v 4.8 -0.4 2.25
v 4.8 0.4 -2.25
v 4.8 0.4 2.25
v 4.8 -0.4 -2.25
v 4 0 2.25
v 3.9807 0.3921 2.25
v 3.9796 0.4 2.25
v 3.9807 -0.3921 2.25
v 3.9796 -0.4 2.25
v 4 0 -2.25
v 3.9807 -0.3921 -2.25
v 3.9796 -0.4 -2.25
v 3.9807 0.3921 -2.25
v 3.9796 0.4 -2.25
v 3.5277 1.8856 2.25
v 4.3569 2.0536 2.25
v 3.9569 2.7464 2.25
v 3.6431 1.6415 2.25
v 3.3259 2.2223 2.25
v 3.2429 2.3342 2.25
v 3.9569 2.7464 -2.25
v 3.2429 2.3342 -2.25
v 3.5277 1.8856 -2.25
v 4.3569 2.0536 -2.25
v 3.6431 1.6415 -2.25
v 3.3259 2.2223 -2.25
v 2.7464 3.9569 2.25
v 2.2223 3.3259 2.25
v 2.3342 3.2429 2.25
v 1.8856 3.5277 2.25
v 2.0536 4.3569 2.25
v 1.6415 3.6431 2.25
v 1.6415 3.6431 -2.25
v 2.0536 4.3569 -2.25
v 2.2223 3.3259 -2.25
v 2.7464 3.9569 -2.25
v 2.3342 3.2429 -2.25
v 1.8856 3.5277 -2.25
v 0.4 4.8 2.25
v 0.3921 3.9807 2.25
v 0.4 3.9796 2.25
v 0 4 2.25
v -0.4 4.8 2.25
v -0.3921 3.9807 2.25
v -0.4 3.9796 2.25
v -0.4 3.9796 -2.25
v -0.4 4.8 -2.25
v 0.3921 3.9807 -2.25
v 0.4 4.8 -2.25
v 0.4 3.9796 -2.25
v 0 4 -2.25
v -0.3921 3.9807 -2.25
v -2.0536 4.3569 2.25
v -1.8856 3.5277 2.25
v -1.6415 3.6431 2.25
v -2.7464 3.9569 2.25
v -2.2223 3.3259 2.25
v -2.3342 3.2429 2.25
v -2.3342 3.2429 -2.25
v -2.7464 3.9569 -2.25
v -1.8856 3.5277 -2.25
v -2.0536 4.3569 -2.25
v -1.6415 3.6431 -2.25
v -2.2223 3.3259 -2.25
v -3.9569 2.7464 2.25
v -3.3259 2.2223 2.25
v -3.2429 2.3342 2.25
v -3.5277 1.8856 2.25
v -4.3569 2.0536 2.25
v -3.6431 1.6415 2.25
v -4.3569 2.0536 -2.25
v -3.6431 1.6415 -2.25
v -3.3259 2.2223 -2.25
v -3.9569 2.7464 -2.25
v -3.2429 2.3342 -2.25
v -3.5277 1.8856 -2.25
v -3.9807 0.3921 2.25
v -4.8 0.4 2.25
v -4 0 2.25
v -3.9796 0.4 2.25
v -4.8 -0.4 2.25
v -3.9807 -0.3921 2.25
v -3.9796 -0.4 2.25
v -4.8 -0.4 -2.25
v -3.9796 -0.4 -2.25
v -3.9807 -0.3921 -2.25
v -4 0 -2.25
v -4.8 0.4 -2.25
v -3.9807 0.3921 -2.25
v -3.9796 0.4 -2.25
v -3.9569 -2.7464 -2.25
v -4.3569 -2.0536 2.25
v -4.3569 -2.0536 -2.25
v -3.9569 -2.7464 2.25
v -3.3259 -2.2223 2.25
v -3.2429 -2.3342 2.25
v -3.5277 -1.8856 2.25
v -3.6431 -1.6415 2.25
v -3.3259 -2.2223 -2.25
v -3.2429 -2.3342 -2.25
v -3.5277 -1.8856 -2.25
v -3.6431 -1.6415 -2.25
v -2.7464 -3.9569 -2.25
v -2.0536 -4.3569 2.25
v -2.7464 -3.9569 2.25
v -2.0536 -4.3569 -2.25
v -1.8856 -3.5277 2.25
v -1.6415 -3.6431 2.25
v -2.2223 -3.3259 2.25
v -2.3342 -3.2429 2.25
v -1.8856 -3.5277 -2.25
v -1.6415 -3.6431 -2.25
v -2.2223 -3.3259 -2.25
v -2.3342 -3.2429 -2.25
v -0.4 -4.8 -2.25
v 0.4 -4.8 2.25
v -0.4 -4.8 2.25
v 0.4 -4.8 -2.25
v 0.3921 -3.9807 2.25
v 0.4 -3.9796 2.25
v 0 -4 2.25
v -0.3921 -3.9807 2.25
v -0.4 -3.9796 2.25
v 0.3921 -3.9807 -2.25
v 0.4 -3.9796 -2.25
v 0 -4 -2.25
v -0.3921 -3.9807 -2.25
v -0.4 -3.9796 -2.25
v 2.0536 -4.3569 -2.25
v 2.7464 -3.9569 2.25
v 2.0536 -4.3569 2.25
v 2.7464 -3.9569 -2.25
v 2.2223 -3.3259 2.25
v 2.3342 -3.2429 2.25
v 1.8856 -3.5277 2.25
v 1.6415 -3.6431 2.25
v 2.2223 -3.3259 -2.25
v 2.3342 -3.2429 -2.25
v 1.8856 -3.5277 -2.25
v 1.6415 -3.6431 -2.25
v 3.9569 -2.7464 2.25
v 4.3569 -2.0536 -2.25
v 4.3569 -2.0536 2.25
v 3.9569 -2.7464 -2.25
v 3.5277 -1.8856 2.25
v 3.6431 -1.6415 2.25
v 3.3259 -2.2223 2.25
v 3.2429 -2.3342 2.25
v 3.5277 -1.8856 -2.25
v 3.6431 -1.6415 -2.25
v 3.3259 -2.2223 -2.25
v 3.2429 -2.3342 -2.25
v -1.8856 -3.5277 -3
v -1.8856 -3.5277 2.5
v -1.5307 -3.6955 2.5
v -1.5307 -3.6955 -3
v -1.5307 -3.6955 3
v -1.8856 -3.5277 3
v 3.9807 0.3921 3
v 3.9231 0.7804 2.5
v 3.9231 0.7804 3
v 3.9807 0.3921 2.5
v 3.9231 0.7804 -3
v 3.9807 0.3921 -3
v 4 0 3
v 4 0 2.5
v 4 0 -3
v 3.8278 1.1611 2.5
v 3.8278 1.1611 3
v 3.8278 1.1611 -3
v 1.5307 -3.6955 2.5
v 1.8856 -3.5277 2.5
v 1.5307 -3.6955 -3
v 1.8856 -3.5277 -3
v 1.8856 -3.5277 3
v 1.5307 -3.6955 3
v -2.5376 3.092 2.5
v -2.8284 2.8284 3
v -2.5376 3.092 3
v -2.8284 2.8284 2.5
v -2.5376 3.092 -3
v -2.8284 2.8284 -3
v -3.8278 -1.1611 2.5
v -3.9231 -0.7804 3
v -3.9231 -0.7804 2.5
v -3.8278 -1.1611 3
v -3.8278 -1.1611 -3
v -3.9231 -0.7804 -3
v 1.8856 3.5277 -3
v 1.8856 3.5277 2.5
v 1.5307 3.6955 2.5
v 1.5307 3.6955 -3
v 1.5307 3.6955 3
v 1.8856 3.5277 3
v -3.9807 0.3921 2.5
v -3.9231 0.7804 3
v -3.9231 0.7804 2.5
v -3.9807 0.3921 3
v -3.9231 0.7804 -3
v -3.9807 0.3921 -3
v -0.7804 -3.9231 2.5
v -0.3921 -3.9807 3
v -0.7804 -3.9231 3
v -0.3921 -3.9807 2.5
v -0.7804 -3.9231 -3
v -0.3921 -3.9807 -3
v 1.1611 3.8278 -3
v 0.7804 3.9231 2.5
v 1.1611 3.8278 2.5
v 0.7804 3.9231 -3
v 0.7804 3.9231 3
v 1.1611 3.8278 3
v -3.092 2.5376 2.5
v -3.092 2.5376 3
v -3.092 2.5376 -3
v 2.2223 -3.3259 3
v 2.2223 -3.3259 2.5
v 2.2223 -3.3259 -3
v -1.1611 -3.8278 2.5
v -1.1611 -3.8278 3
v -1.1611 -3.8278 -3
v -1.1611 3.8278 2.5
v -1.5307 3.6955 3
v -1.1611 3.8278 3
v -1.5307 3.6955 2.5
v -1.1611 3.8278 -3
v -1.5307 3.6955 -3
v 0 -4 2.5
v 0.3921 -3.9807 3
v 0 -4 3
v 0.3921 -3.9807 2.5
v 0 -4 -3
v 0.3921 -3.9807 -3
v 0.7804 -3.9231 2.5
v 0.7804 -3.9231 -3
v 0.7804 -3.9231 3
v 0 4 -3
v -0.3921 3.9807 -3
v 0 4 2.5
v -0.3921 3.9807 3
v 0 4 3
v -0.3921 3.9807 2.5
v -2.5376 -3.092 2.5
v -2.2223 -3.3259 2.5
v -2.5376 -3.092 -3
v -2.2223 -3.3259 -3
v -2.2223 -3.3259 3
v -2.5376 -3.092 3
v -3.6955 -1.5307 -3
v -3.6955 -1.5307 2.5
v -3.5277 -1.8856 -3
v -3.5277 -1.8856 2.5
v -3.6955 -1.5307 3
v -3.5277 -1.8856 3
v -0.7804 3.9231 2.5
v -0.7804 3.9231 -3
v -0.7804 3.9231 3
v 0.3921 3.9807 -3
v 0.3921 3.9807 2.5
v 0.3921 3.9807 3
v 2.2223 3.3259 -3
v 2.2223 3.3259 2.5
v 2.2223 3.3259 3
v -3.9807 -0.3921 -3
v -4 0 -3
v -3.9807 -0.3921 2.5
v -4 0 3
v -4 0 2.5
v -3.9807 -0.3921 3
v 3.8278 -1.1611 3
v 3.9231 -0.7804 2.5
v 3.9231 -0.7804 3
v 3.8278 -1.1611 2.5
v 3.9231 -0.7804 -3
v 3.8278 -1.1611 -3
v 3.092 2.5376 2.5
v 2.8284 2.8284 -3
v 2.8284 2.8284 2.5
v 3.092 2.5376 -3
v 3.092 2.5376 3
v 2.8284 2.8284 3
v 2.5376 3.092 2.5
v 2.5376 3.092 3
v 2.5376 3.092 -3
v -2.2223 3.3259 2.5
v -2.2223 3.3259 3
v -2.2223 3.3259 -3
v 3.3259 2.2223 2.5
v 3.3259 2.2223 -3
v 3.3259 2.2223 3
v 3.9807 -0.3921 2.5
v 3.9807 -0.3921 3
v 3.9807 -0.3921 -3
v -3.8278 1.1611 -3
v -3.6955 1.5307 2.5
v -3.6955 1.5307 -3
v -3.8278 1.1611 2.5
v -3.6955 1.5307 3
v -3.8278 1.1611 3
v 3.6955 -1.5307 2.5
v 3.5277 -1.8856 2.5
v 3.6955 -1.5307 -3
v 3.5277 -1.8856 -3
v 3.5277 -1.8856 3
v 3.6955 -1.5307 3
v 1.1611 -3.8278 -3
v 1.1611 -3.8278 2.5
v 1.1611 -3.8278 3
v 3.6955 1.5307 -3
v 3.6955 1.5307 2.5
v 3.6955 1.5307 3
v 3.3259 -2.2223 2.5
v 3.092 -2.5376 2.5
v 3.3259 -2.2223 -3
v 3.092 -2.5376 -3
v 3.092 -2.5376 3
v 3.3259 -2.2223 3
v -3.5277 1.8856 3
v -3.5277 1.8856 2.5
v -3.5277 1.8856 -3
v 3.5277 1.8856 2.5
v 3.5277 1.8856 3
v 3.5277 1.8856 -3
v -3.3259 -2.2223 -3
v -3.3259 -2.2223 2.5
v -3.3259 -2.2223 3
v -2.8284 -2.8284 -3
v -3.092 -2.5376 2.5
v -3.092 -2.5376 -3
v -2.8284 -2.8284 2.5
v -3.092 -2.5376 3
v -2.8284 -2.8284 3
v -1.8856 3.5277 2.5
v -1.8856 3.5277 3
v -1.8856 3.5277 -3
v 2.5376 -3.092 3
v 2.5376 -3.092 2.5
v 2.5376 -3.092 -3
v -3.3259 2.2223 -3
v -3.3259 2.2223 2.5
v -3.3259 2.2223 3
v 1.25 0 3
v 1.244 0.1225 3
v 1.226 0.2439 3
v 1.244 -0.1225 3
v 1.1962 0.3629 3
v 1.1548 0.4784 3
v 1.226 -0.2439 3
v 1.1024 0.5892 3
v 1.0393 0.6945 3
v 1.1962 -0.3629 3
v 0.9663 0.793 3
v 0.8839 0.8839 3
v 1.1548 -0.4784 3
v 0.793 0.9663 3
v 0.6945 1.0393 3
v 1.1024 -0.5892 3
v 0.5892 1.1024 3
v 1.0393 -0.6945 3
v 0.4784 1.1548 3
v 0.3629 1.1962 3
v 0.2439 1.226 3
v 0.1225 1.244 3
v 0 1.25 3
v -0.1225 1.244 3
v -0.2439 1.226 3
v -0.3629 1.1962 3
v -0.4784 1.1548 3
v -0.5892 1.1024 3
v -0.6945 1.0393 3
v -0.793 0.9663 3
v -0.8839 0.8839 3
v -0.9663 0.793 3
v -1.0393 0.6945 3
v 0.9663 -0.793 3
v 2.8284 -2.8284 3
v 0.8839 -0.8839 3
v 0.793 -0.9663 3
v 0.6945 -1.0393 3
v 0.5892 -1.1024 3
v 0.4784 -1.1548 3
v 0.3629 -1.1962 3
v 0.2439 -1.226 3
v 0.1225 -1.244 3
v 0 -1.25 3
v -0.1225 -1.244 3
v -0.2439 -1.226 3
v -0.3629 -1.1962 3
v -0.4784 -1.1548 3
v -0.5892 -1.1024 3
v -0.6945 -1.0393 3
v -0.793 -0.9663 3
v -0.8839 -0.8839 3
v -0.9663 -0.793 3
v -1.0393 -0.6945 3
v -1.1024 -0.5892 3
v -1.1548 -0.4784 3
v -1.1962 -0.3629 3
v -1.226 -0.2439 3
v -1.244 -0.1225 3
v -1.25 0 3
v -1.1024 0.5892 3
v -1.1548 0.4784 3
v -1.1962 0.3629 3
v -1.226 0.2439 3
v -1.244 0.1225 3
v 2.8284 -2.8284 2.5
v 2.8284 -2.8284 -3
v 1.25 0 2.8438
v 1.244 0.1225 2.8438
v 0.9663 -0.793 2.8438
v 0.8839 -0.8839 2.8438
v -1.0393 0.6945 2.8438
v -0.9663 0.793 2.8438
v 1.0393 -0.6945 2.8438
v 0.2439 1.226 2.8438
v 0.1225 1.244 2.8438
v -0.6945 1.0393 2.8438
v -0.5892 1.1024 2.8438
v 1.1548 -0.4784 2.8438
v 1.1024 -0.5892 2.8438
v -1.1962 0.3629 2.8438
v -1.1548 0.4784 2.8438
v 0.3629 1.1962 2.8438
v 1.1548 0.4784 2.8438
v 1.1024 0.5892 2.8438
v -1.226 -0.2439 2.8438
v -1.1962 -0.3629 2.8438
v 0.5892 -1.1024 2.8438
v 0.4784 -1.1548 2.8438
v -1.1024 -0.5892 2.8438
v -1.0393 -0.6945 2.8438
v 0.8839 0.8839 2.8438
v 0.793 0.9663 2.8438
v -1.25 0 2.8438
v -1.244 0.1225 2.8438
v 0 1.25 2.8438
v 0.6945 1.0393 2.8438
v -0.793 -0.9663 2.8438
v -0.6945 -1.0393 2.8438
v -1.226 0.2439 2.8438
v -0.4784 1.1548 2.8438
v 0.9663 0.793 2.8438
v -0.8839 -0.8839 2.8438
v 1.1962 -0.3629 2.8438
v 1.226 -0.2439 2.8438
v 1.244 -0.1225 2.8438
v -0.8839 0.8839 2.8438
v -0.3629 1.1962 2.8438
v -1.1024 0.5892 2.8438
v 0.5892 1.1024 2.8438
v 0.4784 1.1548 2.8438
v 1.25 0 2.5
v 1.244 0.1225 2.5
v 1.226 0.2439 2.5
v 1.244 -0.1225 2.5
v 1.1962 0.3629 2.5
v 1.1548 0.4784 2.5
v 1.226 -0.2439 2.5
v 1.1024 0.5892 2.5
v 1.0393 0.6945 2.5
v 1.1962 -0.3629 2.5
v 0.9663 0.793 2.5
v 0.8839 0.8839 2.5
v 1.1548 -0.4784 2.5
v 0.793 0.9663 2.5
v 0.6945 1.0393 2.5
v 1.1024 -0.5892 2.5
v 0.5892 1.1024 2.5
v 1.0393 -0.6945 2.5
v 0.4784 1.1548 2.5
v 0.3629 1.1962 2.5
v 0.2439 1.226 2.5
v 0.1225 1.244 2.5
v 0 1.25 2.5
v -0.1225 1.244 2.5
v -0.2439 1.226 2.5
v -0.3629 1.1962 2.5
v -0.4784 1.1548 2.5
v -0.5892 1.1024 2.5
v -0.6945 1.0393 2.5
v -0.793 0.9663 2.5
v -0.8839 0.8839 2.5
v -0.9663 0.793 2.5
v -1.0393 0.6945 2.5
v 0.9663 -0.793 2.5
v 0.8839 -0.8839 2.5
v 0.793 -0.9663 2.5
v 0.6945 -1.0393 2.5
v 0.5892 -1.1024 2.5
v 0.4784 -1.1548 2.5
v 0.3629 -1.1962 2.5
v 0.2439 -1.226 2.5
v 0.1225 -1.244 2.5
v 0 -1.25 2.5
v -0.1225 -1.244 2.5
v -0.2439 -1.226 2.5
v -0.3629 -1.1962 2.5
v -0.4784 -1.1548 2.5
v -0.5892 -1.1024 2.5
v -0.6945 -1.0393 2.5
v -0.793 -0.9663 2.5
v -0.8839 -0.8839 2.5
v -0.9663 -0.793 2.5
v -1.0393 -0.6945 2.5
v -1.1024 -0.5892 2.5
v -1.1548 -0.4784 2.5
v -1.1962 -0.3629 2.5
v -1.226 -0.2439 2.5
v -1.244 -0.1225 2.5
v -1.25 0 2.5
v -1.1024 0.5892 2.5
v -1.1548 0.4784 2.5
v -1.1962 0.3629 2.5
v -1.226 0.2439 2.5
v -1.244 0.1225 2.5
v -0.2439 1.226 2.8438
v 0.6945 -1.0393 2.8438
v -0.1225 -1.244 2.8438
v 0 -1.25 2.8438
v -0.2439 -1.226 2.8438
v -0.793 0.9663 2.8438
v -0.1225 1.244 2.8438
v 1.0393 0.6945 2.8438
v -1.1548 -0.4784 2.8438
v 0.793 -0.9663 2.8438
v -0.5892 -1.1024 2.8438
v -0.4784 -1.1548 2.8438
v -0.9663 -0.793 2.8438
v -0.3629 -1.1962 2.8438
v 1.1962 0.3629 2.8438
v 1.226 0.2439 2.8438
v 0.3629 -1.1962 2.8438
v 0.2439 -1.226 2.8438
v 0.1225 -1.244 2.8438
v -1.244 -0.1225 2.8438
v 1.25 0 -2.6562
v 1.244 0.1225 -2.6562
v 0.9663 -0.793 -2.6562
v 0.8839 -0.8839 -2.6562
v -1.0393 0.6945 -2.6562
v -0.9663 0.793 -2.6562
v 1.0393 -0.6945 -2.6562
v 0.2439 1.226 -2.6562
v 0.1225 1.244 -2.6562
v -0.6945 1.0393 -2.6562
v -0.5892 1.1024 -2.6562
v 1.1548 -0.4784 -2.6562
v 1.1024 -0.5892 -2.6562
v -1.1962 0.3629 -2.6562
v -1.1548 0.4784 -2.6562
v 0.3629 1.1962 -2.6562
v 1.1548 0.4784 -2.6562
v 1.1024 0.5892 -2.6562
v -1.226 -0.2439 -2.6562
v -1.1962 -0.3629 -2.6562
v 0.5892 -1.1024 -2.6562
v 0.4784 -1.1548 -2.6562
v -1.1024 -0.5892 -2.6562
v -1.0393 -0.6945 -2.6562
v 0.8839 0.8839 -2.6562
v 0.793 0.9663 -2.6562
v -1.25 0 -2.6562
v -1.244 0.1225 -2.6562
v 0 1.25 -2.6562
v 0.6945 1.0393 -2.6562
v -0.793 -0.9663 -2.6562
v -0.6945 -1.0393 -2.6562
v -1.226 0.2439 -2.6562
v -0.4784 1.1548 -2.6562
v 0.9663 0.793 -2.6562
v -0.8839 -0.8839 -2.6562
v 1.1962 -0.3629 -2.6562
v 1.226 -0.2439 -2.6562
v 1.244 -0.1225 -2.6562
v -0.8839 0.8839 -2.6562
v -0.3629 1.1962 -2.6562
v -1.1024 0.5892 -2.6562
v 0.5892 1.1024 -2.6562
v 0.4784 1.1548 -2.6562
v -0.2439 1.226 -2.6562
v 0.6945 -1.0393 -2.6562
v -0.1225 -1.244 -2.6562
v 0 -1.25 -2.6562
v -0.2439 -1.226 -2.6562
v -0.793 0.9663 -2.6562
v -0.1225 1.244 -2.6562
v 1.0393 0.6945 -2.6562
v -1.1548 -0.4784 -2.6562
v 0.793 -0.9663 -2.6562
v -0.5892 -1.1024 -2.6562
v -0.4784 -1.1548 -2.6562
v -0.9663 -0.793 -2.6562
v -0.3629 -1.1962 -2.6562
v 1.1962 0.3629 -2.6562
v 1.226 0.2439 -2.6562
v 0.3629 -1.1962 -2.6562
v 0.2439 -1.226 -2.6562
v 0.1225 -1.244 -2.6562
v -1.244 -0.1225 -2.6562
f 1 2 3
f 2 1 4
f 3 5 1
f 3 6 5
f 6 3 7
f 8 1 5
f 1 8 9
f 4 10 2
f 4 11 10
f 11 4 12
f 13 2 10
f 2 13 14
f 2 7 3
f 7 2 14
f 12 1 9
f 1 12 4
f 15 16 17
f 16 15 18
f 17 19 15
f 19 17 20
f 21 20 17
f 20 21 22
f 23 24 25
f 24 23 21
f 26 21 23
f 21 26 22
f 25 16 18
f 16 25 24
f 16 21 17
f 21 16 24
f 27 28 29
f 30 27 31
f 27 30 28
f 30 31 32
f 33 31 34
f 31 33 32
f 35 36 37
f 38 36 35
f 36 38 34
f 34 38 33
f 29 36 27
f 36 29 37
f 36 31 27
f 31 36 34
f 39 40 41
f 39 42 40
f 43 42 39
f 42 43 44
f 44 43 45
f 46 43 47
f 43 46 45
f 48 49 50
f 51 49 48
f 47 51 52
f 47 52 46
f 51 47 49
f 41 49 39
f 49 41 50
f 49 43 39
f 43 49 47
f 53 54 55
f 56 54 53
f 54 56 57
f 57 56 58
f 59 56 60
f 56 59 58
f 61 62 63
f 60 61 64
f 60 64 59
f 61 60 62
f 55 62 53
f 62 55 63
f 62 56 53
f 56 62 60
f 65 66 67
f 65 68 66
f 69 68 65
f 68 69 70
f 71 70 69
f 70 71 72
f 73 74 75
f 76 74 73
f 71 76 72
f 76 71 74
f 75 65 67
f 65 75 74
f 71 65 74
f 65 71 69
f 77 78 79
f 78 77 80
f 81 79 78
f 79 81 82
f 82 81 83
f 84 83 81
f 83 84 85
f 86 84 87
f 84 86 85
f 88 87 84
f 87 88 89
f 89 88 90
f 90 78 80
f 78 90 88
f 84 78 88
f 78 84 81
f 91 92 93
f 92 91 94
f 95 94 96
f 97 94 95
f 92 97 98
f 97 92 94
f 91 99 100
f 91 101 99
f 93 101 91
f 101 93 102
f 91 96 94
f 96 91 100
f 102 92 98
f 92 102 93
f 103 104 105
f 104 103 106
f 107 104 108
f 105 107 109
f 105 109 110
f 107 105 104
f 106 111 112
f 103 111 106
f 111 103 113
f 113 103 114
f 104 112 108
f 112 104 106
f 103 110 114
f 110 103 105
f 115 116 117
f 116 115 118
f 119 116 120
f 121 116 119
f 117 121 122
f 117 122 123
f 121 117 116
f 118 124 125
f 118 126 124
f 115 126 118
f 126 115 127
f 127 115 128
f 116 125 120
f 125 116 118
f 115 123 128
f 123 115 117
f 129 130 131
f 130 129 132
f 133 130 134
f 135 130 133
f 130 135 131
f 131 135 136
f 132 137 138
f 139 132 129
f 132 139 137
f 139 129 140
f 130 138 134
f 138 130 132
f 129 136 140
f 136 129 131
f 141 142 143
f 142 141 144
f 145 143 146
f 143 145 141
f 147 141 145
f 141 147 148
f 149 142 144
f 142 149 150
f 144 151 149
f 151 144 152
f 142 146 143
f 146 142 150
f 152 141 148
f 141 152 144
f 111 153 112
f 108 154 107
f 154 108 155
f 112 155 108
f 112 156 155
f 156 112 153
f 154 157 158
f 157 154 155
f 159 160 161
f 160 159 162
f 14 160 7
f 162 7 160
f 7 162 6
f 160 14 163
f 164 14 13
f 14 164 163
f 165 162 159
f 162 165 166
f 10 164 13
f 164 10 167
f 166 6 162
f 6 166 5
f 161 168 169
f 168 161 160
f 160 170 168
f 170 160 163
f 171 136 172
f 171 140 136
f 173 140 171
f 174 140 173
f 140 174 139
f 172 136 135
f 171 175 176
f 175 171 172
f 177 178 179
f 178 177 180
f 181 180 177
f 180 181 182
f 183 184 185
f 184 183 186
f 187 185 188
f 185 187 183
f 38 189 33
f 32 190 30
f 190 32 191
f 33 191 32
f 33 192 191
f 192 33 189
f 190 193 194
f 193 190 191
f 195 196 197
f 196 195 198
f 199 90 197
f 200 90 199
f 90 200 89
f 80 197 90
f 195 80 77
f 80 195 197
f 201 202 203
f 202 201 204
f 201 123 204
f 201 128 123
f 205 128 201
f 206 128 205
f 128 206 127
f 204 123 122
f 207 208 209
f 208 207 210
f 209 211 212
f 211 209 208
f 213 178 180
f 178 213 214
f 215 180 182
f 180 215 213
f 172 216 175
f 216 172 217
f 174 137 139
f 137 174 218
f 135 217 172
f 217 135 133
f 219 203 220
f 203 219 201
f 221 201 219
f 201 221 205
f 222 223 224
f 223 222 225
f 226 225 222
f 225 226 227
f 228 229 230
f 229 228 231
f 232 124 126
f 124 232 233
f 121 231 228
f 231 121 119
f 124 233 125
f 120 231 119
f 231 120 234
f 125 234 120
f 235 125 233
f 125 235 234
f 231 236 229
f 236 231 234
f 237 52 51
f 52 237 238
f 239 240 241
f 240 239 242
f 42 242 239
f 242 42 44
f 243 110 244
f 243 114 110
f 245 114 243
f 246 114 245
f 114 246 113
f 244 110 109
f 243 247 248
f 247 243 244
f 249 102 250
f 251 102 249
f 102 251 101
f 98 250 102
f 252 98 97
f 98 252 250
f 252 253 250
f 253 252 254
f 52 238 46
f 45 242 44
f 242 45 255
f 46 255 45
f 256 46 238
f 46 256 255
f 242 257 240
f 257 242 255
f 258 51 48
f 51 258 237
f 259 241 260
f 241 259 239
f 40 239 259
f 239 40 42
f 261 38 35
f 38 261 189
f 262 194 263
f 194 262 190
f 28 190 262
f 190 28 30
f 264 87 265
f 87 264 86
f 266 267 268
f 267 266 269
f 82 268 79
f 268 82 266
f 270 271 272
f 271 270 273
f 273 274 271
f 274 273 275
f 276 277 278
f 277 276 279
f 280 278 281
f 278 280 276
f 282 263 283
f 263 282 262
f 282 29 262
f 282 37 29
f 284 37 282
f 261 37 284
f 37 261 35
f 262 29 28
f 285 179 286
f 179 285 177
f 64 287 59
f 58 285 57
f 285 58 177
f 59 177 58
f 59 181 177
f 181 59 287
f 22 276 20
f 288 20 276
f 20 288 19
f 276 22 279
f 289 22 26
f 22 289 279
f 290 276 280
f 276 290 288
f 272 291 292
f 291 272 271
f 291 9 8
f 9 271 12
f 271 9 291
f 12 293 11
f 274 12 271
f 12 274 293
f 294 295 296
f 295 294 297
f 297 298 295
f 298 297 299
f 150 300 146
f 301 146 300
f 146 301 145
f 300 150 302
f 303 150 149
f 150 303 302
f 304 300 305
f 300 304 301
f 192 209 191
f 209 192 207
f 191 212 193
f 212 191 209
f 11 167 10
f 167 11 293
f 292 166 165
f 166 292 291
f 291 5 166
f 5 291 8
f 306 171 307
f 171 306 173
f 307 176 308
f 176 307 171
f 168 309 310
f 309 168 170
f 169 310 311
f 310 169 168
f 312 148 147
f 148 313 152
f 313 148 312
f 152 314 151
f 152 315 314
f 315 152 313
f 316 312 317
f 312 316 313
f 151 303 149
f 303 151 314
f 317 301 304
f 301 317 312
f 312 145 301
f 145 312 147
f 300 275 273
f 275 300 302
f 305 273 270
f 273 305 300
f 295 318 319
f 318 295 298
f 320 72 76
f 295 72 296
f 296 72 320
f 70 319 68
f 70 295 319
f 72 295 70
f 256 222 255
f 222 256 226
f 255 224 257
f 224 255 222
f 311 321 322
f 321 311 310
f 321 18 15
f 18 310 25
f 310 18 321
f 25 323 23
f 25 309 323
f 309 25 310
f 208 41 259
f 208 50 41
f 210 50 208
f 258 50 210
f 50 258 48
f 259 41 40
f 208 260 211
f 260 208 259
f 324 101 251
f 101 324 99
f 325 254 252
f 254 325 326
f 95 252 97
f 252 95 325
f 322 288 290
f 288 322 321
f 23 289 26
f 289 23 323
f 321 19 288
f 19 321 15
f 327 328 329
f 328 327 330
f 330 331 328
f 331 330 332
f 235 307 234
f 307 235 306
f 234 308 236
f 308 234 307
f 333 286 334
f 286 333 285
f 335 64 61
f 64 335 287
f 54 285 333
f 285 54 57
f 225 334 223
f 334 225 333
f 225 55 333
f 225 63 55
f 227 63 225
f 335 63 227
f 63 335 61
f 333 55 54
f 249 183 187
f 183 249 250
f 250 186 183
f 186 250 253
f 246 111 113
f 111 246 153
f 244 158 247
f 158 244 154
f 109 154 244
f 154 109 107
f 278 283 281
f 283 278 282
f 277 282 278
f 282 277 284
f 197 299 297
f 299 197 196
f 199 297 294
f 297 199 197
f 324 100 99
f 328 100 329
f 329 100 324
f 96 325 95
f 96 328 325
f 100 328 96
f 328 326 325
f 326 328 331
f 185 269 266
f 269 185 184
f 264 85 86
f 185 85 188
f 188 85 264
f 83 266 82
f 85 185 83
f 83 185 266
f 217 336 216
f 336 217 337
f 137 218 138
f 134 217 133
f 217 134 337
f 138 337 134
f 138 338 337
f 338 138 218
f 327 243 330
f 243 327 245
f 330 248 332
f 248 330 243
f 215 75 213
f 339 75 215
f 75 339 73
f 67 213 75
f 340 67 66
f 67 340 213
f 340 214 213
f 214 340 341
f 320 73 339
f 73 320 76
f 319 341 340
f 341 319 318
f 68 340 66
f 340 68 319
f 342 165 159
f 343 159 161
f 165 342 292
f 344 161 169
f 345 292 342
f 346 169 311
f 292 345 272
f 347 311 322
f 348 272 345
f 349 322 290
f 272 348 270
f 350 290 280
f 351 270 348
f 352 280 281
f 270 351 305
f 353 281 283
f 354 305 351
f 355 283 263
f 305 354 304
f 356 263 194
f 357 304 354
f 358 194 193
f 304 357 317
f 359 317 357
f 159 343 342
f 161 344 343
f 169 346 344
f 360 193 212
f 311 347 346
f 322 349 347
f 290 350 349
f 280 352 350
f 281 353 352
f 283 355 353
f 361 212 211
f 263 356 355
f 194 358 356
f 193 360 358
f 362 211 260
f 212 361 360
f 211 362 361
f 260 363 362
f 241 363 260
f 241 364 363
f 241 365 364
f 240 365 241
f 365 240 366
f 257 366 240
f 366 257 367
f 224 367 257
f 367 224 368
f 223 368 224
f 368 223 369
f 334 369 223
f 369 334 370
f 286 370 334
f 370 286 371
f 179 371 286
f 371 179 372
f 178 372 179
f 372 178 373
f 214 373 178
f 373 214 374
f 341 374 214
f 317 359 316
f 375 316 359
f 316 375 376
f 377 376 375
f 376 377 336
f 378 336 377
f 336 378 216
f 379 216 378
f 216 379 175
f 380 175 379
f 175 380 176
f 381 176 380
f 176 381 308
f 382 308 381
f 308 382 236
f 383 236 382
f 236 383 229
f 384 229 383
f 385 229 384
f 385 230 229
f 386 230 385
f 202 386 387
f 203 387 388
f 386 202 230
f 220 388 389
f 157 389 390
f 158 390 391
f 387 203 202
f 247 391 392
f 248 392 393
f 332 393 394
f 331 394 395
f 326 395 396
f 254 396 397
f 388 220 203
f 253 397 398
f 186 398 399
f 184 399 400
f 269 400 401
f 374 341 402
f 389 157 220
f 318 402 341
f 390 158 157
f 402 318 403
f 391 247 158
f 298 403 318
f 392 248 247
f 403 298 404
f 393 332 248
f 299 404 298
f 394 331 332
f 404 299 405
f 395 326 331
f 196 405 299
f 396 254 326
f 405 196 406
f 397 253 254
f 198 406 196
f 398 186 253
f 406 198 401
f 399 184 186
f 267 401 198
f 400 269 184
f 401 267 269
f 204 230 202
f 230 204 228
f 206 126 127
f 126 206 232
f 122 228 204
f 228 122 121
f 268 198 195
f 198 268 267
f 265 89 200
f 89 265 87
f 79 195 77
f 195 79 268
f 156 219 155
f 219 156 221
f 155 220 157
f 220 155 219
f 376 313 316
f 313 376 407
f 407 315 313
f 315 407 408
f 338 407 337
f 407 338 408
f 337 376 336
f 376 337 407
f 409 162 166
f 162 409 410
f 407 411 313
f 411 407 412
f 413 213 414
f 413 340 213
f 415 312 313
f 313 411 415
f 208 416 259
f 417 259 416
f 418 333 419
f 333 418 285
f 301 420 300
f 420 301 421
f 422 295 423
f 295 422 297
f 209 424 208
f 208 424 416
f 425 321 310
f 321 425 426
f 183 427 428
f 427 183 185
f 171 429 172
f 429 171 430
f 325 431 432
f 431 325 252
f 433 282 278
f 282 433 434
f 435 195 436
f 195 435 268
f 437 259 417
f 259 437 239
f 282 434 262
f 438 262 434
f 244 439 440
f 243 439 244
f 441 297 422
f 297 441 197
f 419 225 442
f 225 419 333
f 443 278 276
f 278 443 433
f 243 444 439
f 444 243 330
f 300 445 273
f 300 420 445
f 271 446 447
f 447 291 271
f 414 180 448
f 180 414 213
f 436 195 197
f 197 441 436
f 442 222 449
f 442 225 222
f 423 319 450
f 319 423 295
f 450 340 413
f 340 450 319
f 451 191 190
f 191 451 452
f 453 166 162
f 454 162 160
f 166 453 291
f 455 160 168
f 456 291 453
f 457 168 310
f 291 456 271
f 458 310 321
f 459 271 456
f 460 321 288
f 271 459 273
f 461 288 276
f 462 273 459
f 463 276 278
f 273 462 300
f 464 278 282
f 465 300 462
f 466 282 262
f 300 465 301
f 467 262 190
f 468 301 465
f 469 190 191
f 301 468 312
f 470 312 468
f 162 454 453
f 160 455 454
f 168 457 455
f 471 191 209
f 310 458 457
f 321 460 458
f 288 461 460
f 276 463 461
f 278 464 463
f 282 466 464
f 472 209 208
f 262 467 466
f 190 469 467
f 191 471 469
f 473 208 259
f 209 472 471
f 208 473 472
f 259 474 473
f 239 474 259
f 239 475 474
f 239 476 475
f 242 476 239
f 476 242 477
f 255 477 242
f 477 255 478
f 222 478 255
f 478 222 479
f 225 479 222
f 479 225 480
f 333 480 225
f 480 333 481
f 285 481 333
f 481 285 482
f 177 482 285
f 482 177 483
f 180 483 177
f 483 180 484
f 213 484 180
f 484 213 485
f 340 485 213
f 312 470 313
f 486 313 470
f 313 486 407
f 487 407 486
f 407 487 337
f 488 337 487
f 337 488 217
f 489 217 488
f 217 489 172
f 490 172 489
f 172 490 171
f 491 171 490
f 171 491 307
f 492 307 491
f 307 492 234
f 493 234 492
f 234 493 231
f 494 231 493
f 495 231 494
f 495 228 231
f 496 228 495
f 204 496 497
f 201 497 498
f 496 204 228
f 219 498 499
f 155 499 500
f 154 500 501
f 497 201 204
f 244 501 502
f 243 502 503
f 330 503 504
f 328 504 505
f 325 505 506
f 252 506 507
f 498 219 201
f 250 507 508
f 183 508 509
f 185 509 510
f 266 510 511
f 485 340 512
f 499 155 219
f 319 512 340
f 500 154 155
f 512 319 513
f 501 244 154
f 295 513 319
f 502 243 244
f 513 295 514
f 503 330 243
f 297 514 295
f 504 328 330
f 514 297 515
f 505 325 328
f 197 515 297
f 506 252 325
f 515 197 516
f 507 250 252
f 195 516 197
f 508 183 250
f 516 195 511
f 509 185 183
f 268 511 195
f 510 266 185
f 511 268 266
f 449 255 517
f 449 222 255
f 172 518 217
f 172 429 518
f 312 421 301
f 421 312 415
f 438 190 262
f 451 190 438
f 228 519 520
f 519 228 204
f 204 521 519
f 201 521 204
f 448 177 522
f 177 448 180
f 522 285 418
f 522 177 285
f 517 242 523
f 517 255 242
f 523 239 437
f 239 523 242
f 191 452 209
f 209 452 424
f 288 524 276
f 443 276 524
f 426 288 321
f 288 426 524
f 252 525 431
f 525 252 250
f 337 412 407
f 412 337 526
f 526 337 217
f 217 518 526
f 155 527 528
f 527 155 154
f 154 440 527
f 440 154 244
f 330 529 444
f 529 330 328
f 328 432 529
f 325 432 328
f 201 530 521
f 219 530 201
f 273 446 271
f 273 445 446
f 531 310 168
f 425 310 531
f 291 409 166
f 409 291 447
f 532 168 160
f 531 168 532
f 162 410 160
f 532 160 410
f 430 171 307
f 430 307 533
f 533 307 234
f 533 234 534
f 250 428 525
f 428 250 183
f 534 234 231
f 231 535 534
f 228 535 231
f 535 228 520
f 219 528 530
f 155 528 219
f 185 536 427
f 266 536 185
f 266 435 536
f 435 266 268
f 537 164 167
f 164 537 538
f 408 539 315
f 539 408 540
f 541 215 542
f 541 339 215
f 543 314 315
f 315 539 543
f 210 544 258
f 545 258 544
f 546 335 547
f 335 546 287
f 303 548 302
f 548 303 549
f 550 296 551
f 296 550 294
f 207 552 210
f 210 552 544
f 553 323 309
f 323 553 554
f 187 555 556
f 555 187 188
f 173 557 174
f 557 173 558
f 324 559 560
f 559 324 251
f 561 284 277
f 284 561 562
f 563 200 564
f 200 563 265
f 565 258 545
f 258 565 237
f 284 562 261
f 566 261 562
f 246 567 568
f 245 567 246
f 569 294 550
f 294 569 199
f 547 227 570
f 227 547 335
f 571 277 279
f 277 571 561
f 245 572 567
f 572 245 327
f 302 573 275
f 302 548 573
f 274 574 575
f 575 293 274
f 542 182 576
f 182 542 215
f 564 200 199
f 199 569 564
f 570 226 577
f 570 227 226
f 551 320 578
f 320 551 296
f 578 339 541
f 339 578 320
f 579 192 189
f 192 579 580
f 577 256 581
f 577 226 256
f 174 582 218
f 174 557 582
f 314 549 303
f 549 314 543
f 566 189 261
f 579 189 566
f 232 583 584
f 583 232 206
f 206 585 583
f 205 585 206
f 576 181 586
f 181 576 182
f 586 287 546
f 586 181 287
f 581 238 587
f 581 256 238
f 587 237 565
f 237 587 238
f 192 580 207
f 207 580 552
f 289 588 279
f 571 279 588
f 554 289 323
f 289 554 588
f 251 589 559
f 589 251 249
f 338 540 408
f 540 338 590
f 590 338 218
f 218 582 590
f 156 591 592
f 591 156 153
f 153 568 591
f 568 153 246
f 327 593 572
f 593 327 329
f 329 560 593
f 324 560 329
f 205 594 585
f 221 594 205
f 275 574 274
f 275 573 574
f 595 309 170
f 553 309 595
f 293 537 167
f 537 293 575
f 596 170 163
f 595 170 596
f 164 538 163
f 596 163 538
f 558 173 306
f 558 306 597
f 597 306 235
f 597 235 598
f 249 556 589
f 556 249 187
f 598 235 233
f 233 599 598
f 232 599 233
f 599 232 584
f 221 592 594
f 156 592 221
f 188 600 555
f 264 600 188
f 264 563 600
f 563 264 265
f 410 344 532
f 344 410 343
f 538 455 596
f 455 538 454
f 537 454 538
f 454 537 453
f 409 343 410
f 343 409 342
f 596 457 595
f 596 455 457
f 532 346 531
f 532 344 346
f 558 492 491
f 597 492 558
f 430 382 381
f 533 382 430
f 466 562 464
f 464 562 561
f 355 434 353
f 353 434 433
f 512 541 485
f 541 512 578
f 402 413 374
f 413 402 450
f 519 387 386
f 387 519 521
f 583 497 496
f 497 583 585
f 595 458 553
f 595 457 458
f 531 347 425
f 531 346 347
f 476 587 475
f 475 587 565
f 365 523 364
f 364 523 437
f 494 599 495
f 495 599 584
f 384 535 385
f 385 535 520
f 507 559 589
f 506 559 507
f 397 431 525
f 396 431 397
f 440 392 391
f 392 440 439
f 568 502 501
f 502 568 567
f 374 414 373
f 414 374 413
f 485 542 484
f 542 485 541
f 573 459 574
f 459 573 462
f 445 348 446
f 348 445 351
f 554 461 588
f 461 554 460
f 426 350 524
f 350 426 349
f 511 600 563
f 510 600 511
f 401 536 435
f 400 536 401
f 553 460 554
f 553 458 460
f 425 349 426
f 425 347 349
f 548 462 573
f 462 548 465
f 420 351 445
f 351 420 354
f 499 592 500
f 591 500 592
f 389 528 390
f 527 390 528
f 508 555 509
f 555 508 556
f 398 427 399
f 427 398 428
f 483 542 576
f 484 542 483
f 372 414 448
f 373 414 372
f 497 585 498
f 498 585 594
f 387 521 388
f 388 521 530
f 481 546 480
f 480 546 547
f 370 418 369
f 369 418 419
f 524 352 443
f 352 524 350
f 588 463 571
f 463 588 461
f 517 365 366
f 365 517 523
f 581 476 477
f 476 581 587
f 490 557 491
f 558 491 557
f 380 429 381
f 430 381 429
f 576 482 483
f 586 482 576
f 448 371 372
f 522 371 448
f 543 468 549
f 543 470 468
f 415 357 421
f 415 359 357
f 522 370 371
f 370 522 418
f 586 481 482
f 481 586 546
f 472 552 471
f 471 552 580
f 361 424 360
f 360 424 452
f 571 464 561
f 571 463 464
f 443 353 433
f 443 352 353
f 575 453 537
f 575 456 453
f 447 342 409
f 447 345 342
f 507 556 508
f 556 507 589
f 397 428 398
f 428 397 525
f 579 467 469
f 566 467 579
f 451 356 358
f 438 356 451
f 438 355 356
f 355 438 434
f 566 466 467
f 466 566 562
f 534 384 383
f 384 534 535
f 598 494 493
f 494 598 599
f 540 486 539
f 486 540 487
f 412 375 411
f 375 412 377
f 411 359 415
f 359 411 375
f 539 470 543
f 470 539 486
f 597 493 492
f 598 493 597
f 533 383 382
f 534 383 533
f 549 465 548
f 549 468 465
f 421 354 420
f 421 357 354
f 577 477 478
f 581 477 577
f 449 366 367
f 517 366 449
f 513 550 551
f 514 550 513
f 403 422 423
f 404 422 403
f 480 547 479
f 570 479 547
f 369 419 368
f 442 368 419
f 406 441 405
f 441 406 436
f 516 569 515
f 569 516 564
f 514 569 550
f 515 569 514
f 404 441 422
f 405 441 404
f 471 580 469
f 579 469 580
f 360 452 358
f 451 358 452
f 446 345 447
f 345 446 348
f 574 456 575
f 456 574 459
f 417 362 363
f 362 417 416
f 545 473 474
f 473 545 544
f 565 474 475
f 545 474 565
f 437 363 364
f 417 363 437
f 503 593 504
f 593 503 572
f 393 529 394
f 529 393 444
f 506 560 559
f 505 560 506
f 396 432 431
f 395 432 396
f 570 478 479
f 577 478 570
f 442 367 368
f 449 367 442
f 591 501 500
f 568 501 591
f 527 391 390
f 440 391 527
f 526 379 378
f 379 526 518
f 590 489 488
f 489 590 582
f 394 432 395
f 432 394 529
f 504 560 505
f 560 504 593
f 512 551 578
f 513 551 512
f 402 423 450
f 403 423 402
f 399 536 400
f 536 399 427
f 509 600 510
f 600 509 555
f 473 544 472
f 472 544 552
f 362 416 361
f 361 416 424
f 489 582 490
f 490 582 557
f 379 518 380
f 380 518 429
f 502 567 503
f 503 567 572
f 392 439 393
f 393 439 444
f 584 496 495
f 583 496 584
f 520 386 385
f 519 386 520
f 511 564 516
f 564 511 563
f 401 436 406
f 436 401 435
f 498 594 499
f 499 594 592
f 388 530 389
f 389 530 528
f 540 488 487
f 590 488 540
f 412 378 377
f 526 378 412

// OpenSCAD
// Parameters
outer_diameter_mm = 8; //[4:16:0.1]
length_mm = 6; //[3:12:0.1]
screw_diameter_mm = 3; //[2:6:0.1]
inner_thread_minor_diameter_mm = 2.5; //[2:5:0.05]
lead_in_chamfer_mm = 0.5; //[0.2:1.5:0.05]
top_entry_chamfer_mm = 0.5; //[0.2:1.5:0.05]
rib_count = 12; //[6:24:1]
rib_radial_height_mm = 0.4; //[0.2:1:0.05]
rib_tangential_width_mm = 0.8; //[0.4:1.6:0.05]
rib_axial_height_mm = 4.5; //[2:10:0.1]
rib_z_margin_mm = 0.5; //[0.2:1.5:0.05]
overlap_mm = 0.8; //[0.5:2:0.1]

// Threaded Insert - complete geometry
module threaded_insert() {
  color([0.8, 0.6, 0.2]) { // Brass color
    difference() {
      union() {
        // Main body
        translate([0, 0, 0])
          cylinder(r=outer_diameter_mm/2, h=length_mm, center=true, $fn=64);
        
        // Ribs
        for (i = [0:rib_count-1]) {
          rotate([0, 0, i*360/rib_count])
            translate([outer_diameter_mm/2 - overlap_mm/2 + (rib_radial_height_mm + overlap_mm)/2, 0, 0])
              cube([rib_radial_height_mm + overlap_mm, rib_tangential_width_mm, rib_axial_height_mm], center=true);
        }
      }
      
      // Top entry chamfer
      translate([0, 0, length_mm/2 - top_entry_chamfer_mm/2])
        cylinder(r1=outer_diameter_mm/2, r2=0, h=top_entry_chamfer_mm, center=true, $fn=64);
      
      // Lead-in chamfer
      translate([0, 0, -length_mm/2 + lead_in_chamfer_mm/2])
        cylinder(r1=outer_diameter_mm/2, r2=0, h=lead_in_chamfer_mm, center=true, $fn=64);
      
      // Internal thread (approximated as a smooth bore)
      translate([0, 0, 0])
        cylinder(r=inner_thread_minor_diameter_mm/2, h=length_mm + 2*overlap_mm, center=true, $fn=64);
    }
  }
}

// Assembly
module assembly() {
  threaded_insert();
}

assembly();
